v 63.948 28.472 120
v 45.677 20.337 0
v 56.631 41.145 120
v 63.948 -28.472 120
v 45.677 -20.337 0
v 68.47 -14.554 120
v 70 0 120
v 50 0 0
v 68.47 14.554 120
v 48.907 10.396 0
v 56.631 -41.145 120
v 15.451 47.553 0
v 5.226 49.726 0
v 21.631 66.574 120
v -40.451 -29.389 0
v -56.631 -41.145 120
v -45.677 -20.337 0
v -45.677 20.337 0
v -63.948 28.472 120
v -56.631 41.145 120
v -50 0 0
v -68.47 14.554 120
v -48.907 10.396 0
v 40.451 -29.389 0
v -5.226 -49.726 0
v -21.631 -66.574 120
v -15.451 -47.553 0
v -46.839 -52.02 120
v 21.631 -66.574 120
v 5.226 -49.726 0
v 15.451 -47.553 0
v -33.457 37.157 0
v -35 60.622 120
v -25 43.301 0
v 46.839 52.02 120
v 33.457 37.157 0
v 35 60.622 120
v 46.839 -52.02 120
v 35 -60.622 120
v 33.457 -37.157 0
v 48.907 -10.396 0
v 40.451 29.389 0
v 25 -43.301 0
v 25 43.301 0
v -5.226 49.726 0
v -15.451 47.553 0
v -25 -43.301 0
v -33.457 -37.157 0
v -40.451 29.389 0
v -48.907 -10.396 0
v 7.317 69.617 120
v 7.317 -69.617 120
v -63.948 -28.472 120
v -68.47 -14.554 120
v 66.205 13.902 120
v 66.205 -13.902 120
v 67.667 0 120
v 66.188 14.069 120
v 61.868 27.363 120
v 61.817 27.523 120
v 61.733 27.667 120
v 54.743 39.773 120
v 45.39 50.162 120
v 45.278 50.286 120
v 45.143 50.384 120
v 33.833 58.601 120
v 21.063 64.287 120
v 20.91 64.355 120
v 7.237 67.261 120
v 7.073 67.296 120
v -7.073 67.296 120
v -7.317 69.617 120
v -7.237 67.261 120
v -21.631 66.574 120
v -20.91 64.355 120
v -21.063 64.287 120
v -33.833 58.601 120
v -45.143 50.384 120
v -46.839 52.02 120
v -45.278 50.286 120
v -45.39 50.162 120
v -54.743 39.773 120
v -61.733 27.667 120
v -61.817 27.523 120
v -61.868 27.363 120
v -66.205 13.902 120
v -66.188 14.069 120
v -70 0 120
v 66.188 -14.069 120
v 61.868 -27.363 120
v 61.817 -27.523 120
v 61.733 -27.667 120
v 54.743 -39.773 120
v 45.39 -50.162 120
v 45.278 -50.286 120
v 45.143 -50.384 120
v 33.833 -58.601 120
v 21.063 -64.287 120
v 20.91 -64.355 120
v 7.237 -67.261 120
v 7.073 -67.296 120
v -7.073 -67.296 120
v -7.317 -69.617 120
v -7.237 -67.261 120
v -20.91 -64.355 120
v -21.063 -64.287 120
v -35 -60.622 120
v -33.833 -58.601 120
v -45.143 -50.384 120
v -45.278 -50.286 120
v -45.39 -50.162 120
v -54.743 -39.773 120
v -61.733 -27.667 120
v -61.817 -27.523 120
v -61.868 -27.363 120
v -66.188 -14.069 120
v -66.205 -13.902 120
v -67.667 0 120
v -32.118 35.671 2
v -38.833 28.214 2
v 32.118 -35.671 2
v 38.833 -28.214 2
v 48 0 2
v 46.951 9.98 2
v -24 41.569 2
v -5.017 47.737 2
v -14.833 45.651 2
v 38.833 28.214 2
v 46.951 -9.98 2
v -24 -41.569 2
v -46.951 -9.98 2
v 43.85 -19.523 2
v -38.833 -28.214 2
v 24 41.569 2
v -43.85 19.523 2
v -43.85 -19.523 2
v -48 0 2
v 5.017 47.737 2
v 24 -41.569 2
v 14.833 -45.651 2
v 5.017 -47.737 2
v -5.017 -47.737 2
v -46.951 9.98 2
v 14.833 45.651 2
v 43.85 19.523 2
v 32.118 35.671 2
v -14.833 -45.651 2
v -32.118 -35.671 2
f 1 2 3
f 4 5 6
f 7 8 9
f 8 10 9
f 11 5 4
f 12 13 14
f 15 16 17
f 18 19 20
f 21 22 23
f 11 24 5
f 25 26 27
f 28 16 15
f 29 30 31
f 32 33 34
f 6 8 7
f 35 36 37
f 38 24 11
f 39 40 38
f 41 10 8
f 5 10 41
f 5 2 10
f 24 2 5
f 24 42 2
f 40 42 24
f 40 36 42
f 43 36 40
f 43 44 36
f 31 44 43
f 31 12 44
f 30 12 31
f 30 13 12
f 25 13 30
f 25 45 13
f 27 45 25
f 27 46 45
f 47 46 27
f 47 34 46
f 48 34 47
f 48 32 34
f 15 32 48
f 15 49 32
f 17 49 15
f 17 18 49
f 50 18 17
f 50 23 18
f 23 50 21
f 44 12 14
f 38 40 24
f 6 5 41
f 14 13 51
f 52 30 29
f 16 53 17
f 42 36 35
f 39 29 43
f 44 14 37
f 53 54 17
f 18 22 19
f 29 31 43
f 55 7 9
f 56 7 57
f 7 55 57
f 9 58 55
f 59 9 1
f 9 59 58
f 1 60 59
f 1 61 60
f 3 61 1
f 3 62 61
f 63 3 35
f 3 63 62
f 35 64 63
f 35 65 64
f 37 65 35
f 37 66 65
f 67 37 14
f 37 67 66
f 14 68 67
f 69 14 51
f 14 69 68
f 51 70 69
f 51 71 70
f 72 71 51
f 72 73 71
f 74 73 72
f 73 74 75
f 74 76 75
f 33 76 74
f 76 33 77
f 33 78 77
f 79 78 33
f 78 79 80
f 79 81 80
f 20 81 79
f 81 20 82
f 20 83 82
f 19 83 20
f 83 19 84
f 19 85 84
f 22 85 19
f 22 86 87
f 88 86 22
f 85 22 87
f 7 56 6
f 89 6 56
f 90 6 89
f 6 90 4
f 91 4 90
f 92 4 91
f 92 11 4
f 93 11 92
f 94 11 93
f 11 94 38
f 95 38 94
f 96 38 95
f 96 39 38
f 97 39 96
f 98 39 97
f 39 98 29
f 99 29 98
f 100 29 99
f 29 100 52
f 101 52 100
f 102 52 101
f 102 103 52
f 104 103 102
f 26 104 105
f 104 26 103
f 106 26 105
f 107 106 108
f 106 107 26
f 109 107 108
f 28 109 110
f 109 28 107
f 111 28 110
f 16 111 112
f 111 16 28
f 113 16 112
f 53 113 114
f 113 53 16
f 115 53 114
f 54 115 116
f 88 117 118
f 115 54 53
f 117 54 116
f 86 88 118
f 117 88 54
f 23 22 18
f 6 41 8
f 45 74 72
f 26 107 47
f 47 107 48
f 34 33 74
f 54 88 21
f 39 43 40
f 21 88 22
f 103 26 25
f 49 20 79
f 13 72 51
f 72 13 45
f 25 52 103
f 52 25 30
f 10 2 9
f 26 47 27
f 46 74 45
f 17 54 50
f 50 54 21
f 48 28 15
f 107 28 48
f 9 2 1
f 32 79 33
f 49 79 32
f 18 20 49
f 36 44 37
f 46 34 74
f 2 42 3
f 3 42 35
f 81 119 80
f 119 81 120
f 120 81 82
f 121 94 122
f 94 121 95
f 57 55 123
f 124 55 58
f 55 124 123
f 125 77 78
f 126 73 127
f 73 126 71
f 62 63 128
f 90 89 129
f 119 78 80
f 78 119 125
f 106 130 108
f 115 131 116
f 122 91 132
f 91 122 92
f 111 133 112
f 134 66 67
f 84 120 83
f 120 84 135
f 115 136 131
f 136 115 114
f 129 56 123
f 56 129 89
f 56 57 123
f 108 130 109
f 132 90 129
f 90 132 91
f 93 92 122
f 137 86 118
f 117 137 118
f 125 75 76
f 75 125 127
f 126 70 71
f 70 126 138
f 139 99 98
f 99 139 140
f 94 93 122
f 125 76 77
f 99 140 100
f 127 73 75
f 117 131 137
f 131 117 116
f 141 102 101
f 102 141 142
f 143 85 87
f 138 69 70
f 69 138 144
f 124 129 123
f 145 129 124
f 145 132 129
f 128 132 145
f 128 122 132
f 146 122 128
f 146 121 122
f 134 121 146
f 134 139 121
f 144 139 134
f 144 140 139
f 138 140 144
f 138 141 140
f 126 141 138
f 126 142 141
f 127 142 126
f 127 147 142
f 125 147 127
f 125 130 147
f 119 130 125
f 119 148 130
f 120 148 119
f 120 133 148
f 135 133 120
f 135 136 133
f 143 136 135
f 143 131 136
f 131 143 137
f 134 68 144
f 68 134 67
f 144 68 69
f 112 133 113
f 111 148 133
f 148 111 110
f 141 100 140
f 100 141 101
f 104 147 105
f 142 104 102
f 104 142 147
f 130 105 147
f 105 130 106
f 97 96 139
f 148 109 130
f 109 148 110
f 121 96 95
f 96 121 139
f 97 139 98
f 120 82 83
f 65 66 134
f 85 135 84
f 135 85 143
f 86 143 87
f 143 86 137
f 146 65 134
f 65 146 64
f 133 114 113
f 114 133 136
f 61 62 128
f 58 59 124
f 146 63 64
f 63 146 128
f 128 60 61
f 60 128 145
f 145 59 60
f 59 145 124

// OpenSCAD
// file: ../../lib/water/flower_pot.scad
// Hydroponicky kosicek prumer 14cm, 70 Kc, 4x70 = 280 Kc
// http://www.growmania.cz/extra-pevny-hydroponicky-kosicek-prumer-14cm-p-4755.html
// flower_pot(120, 65, 40, 2);

module flower_pot(height, top_radius, bottom_radius, wall) {
    difference() {
        cylinder(r1=bottom_radius,r2=top_radius,h=height);
        translate([0,0,wall])
            cylinder(r1=bottom_radius-wall,r2=top_radius-wall,h=height);
    }
}
// main file
include <../../lib/water/flower_pot.scad>;

flower_pot(120, 70, 50, 2);
